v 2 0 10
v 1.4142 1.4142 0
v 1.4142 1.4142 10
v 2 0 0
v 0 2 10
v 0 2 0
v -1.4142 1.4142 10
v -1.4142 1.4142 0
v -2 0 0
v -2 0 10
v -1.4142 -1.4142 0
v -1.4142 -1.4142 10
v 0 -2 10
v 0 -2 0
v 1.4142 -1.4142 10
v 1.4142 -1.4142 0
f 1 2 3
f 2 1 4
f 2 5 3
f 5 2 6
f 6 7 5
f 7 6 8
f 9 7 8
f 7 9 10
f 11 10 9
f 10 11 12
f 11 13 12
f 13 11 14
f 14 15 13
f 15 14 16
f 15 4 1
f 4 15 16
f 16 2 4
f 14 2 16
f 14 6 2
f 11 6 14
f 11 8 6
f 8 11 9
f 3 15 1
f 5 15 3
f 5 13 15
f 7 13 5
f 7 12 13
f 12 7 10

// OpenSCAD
// Unit of length: Unit.MM
cylinder(h = 10.0, d = 4.0, center = false, $fn = 8);
